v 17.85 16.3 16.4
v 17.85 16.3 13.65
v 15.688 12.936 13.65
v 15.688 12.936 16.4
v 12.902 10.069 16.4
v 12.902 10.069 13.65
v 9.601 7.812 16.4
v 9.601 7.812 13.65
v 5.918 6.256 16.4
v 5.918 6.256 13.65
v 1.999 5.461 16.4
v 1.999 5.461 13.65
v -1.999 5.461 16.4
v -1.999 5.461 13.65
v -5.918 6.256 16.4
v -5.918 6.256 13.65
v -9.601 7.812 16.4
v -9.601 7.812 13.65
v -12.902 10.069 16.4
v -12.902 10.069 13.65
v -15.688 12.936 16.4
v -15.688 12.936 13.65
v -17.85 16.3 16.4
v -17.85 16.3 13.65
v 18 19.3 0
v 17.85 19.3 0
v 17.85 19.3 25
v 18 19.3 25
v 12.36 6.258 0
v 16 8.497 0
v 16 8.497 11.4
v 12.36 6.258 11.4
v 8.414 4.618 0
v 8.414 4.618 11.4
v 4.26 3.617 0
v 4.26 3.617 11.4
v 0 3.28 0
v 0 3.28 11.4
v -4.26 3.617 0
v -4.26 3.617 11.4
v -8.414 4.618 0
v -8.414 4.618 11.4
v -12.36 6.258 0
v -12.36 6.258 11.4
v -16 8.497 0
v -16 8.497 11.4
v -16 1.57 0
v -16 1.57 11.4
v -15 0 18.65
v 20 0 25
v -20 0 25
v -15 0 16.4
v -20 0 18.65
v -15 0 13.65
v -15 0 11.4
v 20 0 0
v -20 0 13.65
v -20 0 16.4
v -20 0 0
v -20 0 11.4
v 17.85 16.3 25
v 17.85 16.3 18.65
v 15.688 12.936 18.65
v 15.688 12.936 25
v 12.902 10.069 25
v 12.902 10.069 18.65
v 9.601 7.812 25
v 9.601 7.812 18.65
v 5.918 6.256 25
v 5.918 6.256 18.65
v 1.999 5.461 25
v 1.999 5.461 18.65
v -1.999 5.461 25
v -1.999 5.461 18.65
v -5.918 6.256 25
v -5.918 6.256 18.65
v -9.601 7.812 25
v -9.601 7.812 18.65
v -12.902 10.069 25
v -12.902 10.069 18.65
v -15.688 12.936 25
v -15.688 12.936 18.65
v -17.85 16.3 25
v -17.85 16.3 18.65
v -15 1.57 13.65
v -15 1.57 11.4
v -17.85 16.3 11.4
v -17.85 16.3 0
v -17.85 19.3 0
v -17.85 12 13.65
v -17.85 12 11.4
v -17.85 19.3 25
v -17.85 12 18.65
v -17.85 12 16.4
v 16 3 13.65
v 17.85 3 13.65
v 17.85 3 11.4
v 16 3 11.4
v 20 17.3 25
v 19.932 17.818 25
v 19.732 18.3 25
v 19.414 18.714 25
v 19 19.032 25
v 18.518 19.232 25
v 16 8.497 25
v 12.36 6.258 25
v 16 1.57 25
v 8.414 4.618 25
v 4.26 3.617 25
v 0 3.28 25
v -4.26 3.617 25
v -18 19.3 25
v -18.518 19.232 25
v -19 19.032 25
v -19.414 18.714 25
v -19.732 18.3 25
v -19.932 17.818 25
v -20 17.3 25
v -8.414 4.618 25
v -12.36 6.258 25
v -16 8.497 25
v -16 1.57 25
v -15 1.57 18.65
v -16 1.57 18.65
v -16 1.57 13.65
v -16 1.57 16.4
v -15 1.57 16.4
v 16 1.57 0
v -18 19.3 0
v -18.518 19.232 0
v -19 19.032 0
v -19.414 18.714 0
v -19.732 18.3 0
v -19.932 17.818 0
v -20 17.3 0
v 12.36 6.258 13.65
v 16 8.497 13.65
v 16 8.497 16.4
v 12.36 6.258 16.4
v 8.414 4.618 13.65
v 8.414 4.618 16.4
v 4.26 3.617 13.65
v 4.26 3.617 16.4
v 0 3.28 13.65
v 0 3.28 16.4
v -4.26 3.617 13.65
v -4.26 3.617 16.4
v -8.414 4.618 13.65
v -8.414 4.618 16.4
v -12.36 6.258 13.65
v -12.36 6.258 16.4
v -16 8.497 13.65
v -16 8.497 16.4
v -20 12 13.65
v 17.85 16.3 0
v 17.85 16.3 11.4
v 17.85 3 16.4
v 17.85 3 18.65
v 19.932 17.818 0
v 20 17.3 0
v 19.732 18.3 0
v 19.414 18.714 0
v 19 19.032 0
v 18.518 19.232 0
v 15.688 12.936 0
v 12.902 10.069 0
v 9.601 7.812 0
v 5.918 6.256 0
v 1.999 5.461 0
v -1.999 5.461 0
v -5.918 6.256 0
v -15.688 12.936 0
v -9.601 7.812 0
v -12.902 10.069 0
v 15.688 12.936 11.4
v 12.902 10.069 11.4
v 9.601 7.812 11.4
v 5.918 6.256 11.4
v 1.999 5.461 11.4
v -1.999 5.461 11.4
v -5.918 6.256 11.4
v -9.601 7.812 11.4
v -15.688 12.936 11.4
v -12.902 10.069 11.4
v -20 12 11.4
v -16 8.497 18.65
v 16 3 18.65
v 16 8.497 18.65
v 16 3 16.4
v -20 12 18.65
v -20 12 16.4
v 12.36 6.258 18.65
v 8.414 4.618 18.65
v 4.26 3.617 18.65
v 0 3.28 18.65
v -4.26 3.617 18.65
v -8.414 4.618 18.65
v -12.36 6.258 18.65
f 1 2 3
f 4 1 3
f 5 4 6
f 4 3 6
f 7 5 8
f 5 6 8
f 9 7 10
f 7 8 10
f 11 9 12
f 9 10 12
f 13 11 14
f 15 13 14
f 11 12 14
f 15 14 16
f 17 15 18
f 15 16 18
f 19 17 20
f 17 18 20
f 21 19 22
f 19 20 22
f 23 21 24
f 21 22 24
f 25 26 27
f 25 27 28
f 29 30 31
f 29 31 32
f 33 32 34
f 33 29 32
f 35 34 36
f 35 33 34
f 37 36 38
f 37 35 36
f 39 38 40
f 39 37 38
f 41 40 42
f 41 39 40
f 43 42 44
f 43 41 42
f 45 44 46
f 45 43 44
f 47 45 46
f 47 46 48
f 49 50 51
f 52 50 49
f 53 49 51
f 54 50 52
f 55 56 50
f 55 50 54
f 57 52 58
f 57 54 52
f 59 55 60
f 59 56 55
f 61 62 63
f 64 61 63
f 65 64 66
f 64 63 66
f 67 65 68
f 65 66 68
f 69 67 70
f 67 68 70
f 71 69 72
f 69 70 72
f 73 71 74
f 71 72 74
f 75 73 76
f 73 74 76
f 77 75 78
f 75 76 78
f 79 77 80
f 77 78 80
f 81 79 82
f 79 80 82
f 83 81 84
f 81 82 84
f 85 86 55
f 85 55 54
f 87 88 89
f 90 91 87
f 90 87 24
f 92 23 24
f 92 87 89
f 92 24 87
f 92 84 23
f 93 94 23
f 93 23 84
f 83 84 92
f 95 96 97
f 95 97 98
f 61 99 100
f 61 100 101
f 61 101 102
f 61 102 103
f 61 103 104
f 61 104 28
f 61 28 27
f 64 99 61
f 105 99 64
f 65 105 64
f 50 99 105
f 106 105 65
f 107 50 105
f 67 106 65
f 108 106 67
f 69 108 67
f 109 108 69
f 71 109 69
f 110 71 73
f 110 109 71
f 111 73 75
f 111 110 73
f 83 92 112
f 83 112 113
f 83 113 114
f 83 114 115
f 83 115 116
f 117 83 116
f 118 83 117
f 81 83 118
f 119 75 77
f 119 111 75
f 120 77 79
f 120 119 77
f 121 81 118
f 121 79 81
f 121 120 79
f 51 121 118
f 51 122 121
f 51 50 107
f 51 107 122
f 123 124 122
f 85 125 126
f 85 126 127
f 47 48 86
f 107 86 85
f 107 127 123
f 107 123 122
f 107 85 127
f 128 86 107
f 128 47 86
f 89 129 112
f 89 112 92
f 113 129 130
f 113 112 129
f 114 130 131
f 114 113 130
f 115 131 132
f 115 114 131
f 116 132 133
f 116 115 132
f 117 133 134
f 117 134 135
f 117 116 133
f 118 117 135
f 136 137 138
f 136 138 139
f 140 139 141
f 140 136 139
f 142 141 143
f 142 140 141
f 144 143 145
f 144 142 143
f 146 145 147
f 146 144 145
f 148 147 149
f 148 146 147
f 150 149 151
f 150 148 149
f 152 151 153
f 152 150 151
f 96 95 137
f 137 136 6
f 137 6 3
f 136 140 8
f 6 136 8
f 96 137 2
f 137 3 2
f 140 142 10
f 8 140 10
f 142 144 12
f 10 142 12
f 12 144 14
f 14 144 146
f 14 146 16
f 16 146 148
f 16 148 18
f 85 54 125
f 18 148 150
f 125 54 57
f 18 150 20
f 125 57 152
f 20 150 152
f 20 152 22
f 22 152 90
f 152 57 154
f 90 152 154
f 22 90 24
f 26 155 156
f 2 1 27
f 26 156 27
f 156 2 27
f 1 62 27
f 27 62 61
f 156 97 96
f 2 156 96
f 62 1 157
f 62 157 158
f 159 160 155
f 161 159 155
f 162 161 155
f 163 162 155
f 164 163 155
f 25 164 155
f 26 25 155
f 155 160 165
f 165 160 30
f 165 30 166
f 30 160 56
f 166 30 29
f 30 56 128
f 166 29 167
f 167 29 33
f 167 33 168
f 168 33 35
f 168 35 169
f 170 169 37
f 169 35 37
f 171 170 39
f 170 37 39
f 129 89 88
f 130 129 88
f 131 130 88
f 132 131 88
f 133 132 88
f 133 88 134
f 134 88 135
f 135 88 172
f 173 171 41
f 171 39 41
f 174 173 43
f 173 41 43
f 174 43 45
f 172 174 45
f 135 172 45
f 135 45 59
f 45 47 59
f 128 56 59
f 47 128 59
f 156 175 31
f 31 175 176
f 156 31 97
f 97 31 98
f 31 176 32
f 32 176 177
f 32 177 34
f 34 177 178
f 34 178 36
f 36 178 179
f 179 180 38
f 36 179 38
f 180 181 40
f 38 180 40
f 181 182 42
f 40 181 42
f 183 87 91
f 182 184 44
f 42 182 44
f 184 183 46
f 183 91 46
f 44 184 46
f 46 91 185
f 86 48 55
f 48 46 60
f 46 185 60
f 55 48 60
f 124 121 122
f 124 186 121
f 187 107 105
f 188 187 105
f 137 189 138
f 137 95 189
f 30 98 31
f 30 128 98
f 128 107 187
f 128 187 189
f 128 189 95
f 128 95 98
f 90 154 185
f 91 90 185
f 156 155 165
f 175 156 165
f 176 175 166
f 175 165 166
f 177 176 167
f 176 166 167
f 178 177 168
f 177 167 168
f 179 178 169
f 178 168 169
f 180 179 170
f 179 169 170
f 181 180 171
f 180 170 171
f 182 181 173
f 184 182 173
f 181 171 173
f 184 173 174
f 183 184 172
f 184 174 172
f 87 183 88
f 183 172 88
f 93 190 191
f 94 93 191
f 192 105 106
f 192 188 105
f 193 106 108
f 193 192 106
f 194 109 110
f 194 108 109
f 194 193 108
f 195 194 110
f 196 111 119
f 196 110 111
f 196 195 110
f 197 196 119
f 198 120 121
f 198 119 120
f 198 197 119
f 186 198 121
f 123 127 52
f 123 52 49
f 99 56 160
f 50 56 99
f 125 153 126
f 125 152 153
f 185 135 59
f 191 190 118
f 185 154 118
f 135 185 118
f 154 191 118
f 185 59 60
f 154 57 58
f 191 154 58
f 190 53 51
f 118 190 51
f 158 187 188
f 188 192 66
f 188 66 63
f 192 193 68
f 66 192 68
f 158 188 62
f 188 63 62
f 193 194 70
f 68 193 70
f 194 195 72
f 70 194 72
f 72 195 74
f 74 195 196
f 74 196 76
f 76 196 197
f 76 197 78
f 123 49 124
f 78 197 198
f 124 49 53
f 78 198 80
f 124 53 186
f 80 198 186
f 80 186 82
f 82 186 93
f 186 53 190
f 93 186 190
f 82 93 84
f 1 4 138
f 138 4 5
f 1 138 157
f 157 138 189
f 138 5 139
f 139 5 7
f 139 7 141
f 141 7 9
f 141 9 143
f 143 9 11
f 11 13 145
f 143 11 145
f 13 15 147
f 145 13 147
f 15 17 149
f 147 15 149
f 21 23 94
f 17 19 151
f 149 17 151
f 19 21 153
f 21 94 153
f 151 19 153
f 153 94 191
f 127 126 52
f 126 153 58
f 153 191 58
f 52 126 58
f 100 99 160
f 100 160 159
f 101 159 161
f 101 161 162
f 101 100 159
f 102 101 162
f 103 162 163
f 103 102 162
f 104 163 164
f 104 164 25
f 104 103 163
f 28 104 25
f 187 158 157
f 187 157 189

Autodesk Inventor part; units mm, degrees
ref_plane "YZ Plane" through (0, 0, 0) normal (1, 0, 0) x (0, 1, 0)
ref_plane "XY Plane" through (0, 0, 0) normal (0, 0, 1) x (1, 0, 0)
sketch "Skizze1" plane through (0, 0, 0) normal (0, 0, 1) x (1, 0, 0)
  line L0 (20, 16.3) -> (20, 0)
  line L1 (20, 0) -> (-20, 0)
  line L2 (-20, 0) -> (-20, 16.3)
  line L3 (-16, 8.4971) -> (-16, 1.5701)
  line L4 (-16, 1.5701) -> (16, 1.5701)
  line L5 (16, 1.5701) -> (16, 8.4971)
  line L6 (-20, 16.3) -> (-17.85, 16.3)
  line L7 (20, 16.3) -> (17.85, 16.3)
  arc A0 (-16, 8.4971) -> (16, 8.4971) centre (0, 30.4255) ccw
  arc A1 (-17.85, 16.3) -> (17.85, 16.3) centre (0, 25.395) ccw
  line L8 (2.1309, 0) -> (0, 0)
  line L9 (0, 16.2928) -> (2.1309, 16.2928)
  line L10 (2.1309, 16.2928) -> (2.1309, 0)
  line L11 (2.1309, 0) -> (0, 0)
  line L12 (0, 0) -> (0, 16.2928)
  line L13 (37.8691, 16.2928) -> (40, 16.2928)
  line L14 (40, 16.2928) -> (40, 0)
  line L15 (40, 0) -> (37.8691, 0)
  line L16 (37.8691, 0) -> (37.8691, 16.2928)
  line L17 (0, 0) -> (40, 0)
  line L18 (0, 0) -> (0, 12.8953)
  line L19 (40, 0) -> (40, 79)
  arc A2 (2.1309, 16.2928) -> (37.8691, 16.2928) centre (20, 25.8644) ccw
  line L20 (6.1071, 11.1028) -> (5.3563, 11.7632)
  point P0 (0, 8.1464)
  dimension "d27" = 40
  dimension "d28" = 4
  dimension "d58" = 16.3
  dimension "d60" = 126
  dimension "d61" = 2.15
  dimension "d62" = 2.1309
extrude "Extrusion1" add sketch "Skizze1" along normal blind 25 contours L0 A2 L5 A0 A1 L7 | L0 L1 L10 L4 L5 A2 | A2 A0 L10 A1 | L1 L12 L4 L10 | L10 A0 L12 A1 | L1 L2 L6 A1 L12 A0 L3 L4
sketch "Skizze2" plane through (-20, 16.3, 0) normal (0, 1, 0) x (1, 0, 0)
  line L0 (2.15, 0) -> (0, 0) projected
  line L1 (0, 0) -> (0, -25) projected
  line L2 (2.15, -25) -> (0, -25) projected
  line L3 (2.15, 0) -> (2.15, -25) projected
  point P0 (20, 0)
extrude "Extrusion2" add sketch "Skizze2" along normal blind 3
sketch "Skizze3" plane through (17.85, 16.3, 0) normal (0, 1, 0) x (1, 0, 0)
  line L0 (2.15, 0) -> (0, 0) projected
  line L1 (0, 0) -> (0, -25) projected
  line L2 (2.15, -25) -> (0, -25) projected
  line L3 (2.15, 0) -> (2.15, -25) projected
  point P0 (-17.85, 0)
ref_plane "Arbeitsebene2" through (0, 10, 0) normal (0, 1, 0) x (-1, 0, 0)
extrude "Extrusion3" add sketch "Skizze3" along normal blind 3
sketch "Skizze4" plane through (0, 10, 0) normal (0, 1, 0) x (-1, 0, 0)
  line L0 (-17.85, 0) -> (-17.85, 25) projected
  line L1 (-17.85, 0) -> (17.85, 0) projected
  line L2 (17.85, 0) -> (17.85, 25) projected
  line L3 (-17.85, 25) -> (17.85, 25) projected
  line L4 (-17.85, 0) -> (-17.85, 25) projected
  line L5 (-17.85, 11.4) -> (17.85, 11.4)
  line L6 (-17.85, 13.65) -> (17.85, 13.65)
  line L7 (-17.85, 16.4) -> (17.85, 16.4)
  line L8 (-17.85, 18.65) -> (17.85, 18.65)
  line L9 (-17.85, 25) -> (-20, 25) projected
  point P0 (0, 0)
  point P1 (-17.85, 13.65)
  point P2 (-17.85, 11.4)
  point P3 (-17.85, 18.65)
  point P4 (-17.85, 16.4)
  dimension "d13" = 2.25
  dimension "d14" = 2.25
  dimension "d15" = 25
  dimension "d16" = 2.75
  dimension "d36" = 6.35
extrude "Extrusion4" cut sketch "Skizze4" along normal mid plane 14 contours L0 L6 L2 L5 | L0 L8 L2 L7
fillet "Rundung2" radius 2 2 edges at (-20, 19.3, 12.5) (20, 19.3, 12.5)
sketch "Skizze5" plane through (-16, 1.5701, 0) normal (1, 0, 0) x (0, 0, -1)
  line L0 (0, 0) -> (0, 6.927) projected
  line L1 (0, 6.927) -> (-25, 6.927) projected
  line L2 (-25, 0) -> (-25, 6.927) projected
  line L3 (0, 0) -> (-25, 0) projected
  point P0 (0, -1.5701)
sketch "Skizze12" plane through (-20, 0, 0) normal (-1, 0, 0) x (0, 0, 1)
  line L0 (0, 0) -> (25, 0) projected
  line L1 (18.65, 6.5) -> (18.65, 12)
  line L2 (13.65, 6.5) -> (13.65, 12)
  line L3 (18.65, 12) -> (16.4, 12)
  line L4 (16.4, 12) -> (16.4, 0)
  line L5 (16.4, 0) -> (18.65, 0)
  line L6 (18.65, 0) -> (18.65, 12)
  line L7 (13.65, 12) -> (11.4, 12)
  line L8 (11.4, 12) -> (11.4, 0)
  line L9 (11.4, 0) -> (13.65, 0)
  line L10 (13.65, 0) -> (13.65, 12)
  point P0 (27, 0)
  point P1 (13.65, 0)
  point P2 (18.65, 0)
  dimension "d52" = 2.75
  dimension "d54" = 2.25
  dimension "d55" = 2.25
extrude "Extrusion10" cut sketch "Skizze12" against normal blind 5
sketch "Skizze13" plane through (0, 0, 25) normal (0, 0, 1) x (1, 0, 0)
  arc A0 (20, 17.3) -> (17.85, 19.3) centre (18, 17.3) ccw projected
  line L0 (17.85, 16.3) -> (17.85, 19.3) projected
  arc A1 (-17.85, 16.3) -> (17.85, 16.3) centre (0, 25.395) ccw projected
  line L1 (-17.85, 16.3) -> (-17.85, 19.3) projected
  arc A2 (-17.85, 19.3) -> (-20, 17.3) centre (-18, 17.3) ccw projected
  line L2 (-20, 0) -> (-20, 17.3) projected
  line L3 (-20, 0) -> (20, 0) projected
  line L4 (20, 0) -> (20, 17.3) projected
  arc A3 (-16, 8.4971) -> (16, 8.4971) centre (0, 30.4255) ccw projected
  line L5 (16, 8.4971) -> (16, 1.5701) projected
  line L6 (16, 1.5701) -> (-16, 1.5701) projected
  line L7 (-16, 1.5701) -> (-16, 8.4971) projected
  point P0 (0, 0)
properties part number "Gehäuse_Kurve" material "ABS-Kunststoff"
